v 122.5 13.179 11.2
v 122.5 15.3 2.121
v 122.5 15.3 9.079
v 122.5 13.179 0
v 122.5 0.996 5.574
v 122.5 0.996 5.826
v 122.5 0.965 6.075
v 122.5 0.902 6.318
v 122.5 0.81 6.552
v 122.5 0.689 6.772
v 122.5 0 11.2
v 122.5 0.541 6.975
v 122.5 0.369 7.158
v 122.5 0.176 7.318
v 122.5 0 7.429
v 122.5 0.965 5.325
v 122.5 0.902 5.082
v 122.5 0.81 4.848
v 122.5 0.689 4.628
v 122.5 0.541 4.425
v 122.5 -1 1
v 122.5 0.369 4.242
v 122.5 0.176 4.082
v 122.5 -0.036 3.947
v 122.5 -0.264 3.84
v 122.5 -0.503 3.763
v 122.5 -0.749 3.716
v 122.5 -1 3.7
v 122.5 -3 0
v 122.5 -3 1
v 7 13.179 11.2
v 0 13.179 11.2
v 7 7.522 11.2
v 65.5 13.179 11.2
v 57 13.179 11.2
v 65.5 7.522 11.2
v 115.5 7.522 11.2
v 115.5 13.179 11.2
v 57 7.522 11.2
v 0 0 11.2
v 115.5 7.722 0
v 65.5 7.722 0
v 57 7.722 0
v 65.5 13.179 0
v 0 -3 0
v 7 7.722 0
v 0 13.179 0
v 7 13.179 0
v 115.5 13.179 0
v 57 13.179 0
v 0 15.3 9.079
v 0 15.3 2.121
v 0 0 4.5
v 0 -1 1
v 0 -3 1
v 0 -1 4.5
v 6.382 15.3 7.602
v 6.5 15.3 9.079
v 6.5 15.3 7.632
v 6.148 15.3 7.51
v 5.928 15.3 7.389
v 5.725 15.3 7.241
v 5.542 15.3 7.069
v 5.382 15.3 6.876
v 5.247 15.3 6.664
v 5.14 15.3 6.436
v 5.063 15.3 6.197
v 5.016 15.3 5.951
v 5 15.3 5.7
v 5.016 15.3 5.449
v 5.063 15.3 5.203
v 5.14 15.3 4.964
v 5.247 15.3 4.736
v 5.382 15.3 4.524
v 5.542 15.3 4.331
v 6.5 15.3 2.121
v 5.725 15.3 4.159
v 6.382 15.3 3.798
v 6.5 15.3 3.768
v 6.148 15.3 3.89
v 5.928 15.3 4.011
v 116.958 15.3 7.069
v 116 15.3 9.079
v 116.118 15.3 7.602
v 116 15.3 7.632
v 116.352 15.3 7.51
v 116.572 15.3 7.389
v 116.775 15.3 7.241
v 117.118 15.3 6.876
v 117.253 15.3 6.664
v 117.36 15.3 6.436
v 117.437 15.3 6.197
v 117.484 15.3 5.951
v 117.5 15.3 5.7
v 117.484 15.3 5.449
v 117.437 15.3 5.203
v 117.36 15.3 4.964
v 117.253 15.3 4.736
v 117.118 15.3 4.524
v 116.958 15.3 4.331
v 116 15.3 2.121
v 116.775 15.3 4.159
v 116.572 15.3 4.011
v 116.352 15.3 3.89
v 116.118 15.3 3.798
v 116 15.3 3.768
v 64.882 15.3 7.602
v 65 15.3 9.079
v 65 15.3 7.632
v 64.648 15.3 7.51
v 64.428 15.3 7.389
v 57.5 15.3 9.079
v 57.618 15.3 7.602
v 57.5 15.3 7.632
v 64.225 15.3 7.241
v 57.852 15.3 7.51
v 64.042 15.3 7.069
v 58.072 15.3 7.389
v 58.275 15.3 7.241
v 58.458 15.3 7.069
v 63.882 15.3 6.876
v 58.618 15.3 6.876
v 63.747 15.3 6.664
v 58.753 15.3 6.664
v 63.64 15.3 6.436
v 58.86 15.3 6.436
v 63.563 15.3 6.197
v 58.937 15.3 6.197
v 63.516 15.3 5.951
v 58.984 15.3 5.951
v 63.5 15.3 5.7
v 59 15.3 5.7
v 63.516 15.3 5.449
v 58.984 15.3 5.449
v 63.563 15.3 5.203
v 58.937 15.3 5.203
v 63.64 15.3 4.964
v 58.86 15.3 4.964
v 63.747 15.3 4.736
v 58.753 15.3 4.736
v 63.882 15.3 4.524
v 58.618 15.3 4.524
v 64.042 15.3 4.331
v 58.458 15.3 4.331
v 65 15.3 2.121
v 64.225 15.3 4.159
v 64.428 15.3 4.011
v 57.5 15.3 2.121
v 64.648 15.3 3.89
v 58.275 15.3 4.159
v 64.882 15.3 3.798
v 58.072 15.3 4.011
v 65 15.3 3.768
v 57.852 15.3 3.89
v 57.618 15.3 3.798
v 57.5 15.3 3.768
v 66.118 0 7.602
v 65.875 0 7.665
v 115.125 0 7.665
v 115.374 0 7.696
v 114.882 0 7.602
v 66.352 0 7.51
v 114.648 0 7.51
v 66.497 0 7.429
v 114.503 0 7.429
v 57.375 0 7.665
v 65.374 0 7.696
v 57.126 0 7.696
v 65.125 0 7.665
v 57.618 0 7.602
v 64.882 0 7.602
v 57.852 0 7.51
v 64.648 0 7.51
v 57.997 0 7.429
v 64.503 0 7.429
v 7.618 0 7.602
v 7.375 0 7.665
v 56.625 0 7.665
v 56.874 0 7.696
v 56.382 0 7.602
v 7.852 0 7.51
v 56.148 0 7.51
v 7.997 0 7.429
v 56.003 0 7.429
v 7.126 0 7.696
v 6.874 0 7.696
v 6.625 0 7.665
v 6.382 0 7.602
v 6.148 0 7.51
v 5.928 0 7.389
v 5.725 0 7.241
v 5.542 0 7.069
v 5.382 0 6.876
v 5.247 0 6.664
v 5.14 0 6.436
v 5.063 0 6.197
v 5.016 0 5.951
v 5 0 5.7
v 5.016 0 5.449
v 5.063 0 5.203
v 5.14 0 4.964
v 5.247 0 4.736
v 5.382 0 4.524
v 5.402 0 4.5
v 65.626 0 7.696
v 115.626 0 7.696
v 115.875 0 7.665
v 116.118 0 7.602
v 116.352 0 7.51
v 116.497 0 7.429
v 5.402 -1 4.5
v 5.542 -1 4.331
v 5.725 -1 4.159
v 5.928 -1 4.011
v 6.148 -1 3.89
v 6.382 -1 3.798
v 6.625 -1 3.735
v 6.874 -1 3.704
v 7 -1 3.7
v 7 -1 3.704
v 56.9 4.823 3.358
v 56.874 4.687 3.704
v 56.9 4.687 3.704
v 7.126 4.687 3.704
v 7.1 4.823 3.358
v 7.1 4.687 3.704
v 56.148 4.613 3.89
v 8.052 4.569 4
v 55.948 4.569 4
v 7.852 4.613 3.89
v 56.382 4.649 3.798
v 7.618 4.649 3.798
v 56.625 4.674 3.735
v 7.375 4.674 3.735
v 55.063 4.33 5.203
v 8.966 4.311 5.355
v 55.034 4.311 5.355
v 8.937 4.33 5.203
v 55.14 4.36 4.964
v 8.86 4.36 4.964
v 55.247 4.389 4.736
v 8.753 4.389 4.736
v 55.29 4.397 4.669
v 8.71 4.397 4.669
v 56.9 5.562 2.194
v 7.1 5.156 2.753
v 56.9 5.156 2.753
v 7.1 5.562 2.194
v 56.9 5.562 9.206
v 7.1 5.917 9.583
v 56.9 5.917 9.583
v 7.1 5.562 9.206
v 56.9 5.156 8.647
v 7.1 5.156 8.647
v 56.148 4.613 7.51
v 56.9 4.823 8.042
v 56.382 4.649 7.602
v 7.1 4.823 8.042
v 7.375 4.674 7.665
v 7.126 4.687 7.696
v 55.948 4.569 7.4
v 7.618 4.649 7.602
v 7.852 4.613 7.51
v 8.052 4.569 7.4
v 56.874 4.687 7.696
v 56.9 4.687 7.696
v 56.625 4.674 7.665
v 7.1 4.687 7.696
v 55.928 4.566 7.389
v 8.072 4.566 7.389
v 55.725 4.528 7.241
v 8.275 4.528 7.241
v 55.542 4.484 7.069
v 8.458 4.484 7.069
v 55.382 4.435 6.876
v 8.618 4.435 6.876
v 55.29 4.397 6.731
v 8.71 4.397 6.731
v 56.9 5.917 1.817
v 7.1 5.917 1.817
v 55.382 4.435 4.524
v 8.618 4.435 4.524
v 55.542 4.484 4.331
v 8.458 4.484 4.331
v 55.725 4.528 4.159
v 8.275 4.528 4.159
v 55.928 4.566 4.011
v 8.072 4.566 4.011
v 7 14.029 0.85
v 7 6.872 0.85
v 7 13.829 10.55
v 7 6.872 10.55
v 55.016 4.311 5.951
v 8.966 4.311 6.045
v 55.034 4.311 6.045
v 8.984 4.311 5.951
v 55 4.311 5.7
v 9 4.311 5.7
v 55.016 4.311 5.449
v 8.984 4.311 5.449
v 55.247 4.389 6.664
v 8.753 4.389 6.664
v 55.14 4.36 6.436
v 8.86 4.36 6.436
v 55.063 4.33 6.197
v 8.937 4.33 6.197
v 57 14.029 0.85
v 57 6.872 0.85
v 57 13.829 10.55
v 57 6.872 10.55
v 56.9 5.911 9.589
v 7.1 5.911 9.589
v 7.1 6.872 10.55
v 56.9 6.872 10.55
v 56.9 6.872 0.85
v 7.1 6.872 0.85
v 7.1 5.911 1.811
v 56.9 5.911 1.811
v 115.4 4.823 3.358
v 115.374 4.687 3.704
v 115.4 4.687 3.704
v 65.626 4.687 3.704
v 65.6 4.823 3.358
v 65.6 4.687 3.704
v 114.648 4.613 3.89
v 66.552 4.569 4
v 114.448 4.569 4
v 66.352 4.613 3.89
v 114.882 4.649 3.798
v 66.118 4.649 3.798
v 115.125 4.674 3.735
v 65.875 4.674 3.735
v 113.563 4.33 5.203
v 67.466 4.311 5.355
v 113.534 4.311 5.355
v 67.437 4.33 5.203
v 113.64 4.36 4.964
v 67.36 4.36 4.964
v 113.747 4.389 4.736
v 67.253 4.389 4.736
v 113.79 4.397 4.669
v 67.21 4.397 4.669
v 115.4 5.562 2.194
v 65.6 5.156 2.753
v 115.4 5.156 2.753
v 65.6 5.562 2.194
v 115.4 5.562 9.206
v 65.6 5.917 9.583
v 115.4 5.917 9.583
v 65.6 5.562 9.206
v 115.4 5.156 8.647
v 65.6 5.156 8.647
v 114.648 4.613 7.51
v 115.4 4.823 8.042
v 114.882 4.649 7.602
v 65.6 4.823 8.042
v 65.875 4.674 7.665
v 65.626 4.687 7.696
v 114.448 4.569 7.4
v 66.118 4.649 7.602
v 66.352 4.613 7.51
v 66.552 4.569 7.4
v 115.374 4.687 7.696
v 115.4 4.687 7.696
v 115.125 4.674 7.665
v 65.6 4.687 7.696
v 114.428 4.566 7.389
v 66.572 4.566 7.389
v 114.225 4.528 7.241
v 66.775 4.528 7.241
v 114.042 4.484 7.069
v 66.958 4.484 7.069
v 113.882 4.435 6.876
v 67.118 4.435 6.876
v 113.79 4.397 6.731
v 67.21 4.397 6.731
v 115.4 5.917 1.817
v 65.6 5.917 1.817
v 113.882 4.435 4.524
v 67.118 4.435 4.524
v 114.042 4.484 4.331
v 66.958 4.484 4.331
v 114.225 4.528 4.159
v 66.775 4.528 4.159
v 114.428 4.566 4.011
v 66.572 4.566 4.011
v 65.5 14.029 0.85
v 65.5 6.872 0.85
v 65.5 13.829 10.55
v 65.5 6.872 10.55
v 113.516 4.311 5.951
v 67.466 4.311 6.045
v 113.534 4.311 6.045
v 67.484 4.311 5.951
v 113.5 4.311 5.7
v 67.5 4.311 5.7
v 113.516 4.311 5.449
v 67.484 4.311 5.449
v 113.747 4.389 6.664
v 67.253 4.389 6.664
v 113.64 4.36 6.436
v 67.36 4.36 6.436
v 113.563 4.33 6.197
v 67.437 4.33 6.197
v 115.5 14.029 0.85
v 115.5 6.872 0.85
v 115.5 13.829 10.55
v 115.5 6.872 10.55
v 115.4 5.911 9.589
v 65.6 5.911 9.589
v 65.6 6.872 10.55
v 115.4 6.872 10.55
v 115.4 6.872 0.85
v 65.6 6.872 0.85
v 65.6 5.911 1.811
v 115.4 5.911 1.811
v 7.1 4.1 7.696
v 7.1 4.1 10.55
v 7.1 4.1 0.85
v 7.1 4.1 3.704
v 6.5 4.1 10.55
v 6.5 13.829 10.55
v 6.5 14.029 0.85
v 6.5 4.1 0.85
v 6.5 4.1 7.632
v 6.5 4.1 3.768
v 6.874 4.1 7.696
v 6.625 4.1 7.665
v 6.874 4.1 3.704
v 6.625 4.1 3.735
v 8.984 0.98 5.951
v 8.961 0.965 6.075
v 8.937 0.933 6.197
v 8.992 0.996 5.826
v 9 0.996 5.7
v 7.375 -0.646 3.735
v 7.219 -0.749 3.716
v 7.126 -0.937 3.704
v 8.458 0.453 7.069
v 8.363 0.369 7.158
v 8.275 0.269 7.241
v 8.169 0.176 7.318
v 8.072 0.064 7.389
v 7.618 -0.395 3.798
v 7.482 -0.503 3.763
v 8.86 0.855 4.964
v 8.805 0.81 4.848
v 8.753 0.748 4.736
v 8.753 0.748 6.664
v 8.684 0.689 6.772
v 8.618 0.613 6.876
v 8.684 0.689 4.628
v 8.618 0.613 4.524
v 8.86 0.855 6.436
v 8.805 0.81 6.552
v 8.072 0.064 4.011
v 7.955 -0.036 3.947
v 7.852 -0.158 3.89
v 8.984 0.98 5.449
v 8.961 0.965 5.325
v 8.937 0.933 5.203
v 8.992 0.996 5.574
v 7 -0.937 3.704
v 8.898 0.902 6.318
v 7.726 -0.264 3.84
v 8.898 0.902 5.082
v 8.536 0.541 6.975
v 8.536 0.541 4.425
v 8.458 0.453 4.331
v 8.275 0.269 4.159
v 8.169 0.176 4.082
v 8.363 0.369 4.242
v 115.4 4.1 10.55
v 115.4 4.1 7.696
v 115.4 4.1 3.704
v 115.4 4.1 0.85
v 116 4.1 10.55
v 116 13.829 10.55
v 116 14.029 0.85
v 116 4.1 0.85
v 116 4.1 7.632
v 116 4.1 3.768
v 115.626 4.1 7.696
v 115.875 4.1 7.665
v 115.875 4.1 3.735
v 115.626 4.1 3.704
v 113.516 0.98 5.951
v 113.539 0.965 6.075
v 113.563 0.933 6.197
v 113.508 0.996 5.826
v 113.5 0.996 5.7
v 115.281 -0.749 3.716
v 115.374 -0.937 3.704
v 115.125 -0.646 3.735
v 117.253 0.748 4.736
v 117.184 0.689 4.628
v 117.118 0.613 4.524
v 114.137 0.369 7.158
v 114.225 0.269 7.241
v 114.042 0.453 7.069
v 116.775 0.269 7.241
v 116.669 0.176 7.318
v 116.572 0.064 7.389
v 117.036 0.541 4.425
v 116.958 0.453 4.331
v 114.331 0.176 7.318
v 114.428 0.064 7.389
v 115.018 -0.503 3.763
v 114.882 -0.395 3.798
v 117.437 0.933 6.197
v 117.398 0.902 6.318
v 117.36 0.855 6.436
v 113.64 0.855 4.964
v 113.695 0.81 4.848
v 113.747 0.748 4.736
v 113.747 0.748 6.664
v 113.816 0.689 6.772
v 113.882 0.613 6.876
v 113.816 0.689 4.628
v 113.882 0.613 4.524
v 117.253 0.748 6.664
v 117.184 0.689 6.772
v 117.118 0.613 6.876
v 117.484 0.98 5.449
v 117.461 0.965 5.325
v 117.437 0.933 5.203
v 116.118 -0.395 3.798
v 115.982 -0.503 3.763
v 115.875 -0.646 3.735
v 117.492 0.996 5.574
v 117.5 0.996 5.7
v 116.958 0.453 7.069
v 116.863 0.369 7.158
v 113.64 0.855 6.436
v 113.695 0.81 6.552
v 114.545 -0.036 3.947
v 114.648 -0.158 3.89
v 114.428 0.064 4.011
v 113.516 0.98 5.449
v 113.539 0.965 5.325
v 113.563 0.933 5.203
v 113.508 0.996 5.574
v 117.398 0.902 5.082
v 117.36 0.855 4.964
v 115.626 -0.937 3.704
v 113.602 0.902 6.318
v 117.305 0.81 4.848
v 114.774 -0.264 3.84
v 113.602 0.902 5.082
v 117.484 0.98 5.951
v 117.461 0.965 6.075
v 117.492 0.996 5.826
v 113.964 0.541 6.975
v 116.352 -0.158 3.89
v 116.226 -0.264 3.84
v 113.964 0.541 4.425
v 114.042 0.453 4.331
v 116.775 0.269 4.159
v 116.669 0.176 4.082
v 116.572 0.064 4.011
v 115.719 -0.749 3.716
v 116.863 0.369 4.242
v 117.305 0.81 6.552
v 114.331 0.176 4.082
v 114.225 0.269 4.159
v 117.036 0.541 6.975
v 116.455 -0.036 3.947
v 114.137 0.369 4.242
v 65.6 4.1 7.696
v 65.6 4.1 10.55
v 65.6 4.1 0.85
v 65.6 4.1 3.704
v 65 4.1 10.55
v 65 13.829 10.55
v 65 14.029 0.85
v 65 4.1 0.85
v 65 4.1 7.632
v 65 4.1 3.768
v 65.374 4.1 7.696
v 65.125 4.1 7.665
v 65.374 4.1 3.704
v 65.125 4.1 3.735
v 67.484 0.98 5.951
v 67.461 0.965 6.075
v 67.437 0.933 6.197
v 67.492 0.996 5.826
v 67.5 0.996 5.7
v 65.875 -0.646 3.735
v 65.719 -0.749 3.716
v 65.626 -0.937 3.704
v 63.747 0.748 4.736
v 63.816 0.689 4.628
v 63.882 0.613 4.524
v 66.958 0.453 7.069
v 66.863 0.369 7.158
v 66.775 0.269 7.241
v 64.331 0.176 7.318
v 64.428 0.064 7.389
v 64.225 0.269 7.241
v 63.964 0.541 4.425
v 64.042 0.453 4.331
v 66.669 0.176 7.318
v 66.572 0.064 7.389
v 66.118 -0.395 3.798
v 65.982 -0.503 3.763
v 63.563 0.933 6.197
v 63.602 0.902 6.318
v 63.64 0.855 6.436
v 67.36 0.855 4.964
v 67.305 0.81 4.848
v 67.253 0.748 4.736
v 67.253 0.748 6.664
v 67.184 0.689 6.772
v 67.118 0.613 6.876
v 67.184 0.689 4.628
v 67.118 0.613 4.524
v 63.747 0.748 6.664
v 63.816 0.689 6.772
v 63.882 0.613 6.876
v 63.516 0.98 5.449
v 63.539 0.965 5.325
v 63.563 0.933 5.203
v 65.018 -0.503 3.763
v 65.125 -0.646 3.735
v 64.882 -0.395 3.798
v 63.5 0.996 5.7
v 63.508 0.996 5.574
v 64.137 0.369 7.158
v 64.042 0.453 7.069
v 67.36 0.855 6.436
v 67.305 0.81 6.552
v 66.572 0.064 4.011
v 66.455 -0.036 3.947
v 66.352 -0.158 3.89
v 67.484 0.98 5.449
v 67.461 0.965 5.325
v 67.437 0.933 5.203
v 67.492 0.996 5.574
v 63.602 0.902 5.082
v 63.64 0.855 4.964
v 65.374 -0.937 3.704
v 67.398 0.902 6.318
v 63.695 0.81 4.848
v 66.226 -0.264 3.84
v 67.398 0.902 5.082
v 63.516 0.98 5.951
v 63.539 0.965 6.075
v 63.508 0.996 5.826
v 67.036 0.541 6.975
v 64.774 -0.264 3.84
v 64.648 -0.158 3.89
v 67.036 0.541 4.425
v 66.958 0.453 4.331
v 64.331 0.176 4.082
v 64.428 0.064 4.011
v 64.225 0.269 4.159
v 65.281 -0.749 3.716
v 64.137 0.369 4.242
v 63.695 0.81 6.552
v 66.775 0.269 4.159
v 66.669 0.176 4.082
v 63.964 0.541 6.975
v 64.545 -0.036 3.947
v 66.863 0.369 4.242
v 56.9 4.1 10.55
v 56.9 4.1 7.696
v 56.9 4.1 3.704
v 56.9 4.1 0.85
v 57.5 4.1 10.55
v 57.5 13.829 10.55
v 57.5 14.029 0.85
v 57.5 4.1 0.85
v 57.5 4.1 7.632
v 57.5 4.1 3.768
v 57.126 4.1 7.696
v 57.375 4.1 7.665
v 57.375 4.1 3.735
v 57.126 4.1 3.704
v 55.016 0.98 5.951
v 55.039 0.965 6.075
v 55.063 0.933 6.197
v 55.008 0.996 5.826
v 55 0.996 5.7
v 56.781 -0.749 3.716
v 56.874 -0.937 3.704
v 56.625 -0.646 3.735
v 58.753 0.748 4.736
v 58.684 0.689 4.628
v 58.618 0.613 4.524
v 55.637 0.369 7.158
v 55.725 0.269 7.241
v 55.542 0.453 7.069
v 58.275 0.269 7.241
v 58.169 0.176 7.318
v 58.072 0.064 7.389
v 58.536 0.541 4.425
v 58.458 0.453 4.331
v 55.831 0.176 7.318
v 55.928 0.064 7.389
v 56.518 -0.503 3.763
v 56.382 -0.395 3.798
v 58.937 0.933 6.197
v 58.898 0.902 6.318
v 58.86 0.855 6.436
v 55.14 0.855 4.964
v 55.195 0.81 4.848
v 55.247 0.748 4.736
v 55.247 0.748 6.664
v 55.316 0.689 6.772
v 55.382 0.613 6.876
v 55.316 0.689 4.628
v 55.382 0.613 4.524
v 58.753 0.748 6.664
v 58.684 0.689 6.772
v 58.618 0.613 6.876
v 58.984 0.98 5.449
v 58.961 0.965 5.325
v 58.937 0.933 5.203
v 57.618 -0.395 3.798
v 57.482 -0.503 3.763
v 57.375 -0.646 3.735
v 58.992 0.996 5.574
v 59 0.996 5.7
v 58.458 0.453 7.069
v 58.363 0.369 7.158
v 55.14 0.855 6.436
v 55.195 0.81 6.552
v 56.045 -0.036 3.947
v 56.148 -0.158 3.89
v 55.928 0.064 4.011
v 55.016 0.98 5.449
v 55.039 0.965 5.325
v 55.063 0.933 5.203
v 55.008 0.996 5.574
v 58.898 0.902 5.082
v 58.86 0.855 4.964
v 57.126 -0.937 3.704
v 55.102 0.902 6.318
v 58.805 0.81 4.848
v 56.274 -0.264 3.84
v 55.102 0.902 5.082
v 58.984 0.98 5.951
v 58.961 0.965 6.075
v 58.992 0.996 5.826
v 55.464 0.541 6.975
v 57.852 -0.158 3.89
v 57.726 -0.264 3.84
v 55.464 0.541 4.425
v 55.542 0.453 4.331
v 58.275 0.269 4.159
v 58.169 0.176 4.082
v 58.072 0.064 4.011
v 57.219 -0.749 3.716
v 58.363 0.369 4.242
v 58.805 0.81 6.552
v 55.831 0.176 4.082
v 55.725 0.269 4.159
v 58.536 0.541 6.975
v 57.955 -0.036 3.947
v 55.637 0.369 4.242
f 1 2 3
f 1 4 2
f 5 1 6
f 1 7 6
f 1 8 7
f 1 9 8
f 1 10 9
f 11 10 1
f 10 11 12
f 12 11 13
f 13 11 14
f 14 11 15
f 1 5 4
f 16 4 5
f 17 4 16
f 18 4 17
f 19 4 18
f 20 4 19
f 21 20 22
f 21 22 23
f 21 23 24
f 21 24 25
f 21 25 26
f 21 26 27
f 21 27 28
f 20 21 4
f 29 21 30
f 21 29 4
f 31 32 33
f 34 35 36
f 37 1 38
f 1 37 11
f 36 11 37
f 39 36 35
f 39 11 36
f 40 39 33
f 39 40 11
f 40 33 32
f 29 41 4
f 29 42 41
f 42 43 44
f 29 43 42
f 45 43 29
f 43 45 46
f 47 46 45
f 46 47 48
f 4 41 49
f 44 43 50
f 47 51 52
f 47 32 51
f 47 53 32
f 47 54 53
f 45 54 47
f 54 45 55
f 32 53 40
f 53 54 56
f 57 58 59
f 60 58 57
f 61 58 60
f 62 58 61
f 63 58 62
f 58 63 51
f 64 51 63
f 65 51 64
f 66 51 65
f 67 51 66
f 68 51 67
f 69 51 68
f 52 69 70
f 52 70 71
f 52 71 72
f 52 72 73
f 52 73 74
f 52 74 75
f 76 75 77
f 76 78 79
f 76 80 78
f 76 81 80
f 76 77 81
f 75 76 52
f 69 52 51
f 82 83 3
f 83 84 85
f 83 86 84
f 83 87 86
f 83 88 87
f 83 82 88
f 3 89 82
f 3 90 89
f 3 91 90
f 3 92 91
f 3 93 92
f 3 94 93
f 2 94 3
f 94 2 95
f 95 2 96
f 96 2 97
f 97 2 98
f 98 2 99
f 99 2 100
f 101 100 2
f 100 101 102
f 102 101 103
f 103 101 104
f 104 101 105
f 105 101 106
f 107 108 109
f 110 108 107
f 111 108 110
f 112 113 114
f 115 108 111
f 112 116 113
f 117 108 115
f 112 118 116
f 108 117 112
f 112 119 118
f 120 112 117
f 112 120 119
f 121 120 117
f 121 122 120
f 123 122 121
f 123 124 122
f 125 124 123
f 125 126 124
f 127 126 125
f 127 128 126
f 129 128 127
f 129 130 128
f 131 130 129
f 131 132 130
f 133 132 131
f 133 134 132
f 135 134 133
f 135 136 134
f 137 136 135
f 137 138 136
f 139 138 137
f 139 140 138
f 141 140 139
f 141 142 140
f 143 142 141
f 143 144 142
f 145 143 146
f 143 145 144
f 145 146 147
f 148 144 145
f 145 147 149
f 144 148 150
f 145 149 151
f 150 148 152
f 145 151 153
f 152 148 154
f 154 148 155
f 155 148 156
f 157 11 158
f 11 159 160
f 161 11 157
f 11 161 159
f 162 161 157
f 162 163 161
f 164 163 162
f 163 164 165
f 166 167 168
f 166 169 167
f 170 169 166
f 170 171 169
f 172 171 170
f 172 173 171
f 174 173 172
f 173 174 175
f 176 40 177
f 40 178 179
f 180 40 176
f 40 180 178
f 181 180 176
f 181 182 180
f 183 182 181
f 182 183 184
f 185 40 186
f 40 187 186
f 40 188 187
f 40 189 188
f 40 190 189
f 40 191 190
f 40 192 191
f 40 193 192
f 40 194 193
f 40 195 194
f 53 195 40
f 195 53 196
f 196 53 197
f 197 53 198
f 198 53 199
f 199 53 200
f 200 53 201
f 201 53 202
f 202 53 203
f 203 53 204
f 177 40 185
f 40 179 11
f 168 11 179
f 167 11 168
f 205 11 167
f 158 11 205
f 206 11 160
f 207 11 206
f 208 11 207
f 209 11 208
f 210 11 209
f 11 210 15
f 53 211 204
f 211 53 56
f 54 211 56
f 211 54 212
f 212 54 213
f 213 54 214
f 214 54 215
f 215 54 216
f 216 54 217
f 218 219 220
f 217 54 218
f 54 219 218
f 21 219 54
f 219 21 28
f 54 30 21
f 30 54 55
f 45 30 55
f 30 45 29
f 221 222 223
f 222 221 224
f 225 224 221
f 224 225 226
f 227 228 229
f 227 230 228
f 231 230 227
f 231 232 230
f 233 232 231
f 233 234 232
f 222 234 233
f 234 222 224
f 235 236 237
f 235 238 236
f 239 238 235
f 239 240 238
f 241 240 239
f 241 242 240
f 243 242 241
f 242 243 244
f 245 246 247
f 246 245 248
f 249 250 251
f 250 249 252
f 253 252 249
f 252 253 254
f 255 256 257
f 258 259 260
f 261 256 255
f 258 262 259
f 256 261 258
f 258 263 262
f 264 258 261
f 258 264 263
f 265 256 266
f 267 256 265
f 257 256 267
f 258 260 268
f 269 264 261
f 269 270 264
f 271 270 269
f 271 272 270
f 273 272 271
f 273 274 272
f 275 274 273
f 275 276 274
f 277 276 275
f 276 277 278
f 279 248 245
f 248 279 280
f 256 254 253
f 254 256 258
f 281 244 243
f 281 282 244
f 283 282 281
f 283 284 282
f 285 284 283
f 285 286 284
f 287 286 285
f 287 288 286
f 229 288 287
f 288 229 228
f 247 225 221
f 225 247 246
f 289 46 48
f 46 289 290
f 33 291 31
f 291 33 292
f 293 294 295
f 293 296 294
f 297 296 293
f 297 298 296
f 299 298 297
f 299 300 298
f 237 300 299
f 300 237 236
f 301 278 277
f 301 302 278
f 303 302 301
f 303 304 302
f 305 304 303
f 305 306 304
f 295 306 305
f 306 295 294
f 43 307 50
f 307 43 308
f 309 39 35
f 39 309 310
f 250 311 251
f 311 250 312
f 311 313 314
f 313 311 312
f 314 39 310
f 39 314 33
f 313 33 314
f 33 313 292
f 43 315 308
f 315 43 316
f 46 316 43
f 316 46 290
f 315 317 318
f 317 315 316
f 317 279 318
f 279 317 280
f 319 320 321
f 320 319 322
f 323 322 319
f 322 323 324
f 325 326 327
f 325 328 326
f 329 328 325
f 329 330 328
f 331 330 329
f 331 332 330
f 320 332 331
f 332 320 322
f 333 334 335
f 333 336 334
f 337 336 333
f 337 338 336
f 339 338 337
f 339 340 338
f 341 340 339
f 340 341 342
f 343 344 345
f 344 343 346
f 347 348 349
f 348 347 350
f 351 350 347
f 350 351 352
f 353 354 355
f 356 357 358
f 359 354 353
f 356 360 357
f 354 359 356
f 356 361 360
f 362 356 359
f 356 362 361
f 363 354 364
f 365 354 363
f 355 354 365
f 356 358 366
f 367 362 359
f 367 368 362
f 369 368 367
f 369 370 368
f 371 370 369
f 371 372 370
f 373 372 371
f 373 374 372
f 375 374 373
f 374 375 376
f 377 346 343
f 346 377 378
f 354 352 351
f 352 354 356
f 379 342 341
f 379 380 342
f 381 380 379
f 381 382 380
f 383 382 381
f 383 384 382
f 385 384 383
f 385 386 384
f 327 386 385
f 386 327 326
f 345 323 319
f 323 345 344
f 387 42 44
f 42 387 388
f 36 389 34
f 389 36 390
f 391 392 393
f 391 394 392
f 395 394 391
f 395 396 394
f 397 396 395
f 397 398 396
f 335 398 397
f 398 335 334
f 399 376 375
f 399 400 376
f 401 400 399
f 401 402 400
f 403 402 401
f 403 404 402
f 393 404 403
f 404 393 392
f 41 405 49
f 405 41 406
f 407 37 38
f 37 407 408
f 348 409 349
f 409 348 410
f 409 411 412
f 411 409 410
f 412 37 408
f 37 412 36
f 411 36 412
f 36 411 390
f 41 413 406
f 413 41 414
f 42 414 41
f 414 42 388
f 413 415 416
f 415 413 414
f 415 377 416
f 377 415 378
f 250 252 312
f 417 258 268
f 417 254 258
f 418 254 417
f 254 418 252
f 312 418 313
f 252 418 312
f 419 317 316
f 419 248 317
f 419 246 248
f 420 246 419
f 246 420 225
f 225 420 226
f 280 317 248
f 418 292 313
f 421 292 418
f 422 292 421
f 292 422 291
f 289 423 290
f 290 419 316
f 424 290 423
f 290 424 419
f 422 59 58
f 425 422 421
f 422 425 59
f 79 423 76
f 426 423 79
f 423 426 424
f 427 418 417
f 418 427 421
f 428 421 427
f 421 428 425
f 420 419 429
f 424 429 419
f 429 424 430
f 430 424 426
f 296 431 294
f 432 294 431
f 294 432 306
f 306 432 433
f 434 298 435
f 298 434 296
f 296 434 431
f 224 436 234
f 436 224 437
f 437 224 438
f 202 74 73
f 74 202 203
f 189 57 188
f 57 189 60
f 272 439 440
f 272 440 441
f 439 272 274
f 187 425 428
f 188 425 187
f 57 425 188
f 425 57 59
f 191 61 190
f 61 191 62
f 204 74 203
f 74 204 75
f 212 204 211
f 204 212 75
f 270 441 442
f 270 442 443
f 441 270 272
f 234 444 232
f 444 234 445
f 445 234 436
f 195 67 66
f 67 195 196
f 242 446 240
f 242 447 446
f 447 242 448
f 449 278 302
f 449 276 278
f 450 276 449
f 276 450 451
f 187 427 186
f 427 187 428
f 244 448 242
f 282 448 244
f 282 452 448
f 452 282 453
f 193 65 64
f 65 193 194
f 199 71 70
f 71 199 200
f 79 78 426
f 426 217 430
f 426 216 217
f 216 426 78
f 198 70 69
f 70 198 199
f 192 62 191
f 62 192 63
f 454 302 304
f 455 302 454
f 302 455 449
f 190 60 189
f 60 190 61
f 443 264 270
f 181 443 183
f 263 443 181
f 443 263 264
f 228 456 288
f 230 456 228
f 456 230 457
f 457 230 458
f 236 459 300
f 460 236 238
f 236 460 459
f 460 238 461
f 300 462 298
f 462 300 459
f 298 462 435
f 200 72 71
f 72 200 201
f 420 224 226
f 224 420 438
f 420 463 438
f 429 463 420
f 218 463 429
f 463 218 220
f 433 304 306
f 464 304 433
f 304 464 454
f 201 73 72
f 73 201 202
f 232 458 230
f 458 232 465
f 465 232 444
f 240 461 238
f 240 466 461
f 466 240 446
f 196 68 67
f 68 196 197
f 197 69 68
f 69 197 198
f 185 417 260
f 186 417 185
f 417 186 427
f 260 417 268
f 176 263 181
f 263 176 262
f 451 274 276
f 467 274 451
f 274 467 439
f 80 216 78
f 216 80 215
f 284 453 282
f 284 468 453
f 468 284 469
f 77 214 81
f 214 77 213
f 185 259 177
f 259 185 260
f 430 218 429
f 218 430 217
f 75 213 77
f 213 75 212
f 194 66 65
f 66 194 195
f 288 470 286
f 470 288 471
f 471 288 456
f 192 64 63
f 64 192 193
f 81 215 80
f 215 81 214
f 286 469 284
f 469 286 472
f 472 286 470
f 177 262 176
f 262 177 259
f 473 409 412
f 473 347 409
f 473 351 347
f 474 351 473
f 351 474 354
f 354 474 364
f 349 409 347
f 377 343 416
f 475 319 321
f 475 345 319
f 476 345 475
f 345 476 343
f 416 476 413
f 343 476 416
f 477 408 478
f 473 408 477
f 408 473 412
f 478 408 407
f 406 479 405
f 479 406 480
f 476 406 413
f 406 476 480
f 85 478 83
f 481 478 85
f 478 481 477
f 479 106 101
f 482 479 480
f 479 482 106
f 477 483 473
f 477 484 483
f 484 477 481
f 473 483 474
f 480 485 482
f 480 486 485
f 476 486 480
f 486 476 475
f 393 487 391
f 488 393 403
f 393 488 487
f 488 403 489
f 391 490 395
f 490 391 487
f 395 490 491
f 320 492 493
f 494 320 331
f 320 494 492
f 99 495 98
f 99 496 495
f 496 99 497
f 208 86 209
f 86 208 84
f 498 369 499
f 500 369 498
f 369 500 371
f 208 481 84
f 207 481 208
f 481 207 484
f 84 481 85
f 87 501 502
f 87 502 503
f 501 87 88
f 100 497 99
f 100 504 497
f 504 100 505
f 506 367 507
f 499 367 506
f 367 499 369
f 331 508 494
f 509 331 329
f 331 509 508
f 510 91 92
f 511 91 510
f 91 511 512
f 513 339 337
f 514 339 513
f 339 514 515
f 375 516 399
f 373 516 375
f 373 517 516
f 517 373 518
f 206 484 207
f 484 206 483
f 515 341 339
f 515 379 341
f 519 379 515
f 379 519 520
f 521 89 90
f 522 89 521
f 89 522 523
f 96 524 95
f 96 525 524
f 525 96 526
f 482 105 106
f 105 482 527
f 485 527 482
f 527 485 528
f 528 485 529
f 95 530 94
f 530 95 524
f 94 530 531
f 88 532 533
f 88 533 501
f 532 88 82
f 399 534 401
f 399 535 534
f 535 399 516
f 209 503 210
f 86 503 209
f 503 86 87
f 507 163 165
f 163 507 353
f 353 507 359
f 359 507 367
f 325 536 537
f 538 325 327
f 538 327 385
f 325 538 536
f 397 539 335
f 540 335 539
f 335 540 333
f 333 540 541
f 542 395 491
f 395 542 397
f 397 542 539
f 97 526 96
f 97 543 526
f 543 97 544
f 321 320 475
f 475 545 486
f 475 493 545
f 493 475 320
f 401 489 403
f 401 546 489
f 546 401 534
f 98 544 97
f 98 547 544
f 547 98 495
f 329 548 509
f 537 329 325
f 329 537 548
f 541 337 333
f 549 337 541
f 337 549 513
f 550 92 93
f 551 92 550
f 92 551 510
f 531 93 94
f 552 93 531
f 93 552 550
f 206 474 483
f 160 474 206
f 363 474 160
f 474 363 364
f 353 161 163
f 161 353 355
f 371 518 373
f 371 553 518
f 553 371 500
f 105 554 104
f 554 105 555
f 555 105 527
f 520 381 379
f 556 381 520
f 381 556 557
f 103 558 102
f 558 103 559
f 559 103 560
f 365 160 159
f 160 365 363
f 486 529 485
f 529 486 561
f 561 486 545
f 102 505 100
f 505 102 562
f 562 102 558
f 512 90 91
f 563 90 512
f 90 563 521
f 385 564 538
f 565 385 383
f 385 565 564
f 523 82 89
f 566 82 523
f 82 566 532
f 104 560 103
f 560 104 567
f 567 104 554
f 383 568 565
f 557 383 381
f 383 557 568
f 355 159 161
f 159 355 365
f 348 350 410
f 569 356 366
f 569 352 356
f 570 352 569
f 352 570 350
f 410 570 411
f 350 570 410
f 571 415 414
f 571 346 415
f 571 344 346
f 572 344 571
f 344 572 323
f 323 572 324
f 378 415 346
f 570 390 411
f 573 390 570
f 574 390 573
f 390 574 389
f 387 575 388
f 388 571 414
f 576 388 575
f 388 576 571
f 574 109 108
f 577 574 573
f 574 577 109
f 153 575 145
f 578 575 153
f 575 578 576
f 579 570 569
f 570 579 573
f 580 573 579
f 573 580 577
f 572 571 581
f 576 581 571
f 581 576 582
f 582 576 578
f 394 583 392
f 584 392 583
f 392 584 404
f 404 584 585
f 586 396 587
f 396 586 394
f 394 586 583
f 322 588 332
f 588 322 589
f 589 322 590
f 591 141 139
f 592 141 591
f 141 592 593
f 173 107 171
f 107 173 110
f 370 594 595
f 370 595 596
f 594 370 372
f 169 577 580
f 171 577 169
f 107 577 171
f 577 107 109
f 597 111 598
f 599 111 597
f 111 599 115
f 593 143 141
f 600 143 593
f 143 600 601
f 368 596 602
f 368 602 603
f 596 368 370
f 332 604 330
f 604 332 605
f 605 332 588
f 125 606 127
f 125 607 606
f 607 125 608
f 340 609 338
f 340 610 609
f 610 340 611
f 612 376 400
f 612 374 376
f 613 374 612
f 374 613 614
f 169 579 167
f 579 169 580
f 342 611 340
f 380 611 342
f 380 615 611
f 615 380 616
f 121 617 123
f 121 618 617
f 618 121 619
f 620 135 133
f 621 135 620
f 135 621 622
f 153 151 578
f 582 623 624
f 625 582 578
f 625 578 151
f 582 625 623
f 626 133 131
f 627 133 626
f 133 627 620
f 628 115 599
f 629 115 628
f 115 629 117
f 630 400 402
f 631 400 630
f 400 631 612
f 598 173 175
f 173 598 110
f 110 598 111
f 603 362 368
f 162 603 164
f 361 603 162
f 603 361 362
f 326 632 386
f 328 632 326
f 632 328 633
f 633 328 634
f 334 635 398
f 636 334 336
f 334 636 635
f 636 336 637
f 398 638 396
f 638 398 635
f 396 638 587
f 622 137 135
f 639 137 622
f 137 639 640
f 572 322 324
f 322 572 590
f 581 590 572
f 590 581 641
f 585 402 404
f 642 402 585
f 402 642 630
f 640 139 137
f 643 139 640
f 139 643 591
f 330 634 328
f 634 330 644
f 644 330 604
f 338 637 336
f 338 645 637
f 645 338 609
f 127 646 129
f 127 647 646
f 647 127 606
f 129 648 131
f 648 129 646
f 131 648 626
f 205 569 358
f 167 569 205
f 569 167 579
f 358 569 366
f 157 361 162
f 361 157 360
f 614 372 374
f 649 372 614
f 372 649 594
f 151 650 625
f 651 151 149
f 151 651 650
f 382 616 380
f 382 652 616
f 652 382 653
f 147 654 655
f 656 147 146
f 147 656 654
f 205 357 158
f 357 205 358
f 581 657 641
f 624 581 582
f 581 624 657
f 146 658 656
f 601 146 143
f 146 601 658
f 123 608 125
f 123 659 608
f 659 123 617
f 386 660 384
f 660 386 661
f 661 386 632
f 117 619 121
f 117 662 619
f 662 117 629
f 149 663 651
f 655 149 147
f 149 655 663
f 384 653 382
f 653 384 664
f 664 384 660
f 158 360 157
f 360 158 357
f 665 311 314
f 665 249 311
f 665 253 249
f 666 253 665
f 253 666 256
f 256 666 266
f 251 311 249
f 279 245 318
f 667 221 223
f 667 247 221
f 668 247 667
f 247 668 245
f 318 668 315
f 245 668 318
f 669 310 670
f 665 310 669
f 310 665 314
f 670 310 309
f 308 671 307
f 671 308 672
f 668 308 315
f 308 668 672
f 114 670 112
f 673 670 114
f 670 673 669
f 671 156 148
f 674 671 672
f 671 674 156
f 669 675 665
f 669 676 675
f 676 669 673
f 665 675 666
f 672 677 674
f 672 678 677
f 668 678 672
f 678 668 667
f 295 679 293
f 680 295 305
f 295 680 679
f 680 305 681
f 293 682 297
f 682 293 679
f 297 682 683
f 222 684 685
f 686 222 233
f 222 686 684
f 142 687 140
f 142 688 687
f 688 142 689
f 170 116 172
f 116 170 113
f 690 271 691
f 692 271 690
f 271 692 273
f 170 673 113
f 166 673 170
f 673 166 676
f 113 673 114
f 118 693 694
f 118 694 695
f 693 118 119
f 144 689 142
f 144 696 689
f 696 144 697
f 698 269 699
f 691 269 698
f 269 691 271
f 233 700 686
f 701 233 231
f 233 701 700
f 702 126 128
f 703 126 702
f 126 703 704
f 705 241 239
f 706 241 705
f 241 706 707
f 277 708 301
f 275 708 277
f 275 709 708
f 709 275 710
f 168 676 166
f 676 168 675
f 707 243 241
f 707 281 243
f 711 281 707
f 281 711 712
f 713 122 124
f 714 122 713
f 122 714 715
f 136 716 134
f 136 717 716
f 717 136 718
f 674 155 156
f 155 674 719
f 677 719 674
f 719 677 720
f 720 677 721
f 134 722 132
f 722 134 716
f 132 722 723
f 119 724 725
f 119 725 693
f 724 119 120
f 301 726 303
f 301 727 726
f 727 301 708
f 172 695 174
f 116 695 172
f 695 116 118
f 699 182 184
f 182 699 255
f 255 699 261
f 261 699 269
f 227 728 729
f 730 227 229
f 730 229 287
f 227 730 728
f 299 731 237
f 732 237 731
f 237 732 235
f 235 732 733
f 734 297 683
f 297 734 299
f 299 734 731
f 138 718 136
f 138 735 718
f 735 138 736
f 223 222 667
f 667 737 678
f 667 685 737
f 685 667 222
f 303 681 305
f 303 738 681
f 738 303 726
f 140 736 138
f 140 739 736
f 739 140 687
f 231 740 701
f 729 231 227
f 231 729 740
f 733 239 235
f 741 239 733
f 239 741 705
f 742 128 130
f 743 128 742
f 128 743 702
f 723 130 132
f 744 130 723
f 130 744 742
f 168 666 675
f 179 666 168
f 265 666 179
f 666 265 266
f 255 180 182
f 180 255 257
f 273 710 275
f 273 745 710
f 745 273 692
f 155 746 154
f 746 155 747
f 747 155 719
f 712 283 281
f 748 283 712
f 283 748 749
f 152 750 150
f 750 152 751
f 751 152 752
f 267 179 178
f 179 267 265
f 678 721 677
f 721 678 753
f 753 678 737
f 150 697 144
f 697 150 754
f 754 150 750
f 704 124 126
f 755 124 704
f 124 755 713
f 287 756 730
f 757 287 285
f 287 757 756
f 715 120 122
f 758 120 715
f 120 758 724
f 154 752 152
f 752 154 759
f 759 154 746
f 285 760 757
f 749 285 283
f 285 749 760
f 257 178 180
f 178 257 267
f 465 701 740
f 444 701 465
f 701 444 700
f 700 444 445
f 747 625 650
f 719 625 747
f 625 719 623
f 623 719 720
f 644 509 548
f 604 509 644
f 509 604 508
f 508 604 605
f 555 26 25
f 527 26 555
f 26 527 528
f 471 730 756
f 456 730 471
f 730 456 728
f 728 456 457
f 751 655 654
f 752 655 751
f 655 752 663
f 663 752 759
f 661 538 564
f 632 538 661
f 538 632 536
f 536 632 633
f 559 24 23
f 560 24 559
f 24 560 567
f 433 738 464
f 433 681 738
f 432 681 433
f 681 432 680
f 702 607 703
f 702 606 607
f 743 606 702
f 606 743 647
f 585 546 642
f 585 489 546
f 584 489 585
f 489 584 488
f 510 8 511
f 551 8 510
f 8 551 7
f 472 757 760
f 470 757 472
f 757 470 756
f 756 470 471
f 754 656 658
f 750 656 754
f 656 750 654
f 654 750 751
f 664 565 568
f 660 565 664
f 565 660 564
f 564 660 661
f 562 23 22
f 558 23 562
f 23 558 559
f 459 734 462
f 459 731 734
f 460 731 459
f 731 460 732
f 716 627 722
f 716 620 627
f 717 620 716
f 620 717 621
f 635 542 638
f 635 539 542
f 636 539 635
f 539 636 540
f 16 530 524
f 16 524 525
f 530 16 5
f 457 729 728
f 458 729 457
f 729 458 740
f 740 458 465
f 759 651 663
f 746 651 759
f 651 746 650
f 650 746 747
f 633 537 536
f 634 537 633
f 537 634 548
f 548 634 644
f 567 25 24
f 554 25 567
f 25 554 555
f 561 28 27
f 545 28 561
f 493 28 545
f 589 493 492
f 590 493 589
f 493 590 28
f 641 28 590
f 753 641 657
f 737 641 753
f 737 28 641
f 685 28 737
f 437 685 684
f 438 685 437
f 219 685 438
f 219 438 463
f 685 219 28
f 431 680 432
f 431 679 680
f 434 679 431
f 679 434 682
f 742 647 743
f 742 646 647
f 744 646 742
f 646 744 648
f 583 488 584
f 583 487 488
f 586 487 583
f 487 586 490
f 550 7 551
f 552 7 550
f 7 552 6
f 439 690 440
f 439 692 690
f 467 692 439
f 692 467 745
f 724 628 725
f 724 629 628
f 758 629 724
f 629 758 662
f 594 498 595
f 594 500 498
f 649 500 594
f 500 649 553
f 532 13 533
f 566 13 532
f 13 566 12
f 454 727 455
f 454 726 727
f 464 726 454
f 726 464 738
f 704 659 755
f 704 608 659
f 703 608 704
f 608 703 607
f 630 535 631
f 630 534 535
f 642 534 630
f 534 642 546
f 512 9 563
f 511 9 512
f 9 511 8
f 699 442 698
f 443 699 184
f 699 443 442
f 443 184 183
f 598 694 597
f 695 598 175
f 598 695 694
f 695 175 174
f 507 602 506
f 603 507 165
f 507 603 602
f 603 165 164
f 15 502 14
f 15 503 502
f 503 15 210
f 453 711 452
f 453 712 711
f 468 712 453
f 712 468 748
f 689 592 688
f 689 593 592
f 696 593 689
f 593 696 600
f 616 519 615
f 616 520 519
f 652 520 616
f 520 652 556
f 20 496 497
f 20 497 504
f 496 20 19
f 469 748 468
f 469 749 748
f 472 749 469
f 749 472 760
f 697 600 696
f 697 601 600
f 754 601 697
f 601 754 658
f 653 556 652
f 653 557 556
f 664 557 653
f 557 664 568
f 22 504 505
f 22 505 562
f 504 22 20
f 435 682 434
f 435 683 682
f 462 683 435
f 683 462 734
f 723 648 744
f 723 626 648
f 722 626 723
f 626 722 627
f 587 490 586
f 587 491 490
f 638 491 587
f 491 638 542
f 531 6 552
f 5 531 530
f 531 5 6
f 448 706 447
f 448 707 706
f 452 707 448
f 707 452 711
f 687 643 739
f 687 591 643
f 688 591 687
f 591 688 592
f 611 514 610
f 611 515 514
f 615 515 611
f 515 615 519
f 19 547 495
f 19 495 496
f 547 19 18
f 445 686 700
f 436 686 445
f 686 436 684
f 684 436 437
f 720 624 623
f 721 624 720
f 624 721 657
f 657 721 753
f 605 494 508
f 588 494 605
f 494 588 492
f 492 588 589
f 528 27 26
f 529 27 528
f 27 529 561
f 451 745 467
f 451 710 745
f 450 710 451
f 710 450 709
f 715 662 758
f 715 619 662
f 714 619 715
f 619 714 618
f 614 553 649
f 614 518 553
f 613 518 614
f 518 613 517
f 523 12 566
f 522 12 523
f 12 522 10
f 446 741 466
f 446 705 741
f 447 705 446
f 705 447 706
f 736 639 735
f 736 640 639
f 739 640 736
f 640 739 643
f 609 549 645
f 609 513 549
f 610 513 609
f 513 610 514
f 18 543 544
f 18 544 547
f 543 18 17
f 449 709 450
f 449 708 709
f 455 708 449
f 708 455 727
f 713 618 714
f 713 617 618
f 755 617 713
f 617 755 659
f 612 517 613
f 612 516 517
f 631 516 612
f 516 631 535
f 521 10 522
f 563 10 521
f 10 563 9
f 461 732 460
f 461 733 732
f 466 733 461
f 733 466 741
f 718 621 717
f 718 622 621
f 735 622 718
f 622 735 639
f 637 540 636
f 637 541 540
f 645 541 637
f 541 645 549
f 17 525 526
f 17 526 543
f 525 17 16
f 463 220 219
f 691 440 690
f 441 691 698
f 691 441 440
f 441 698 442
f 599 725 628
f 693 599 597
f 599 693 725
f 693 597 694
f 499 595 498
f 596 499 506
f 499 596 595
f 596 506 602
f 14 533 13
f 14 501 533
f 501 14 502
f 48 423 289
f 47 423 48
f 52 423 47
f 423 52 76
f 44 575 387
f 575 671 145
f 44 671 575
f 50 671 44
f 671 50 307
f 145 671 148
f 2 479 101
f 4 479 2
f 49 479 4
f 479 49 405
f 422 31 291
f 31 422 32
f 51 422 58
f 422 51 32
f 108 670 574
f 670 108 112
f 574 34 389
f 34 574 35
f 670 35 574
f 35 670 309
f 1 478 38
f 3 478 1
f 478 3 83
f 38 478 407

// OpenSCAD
$fn = 50;

width = 122.5;
height = 11.2;
depth = 15.3;
depth_to_pcb = 16.3;
height_to_pcb = 4.5;

aa_dia = 11;
aa_length = 44.5;
contact_length = 50.0 - aa_length;

module battery_with_insertion_path() {
    union() {
        rotate([0, 90, 0])
            cylinder(h=aa_length + contact_length, d = aa_dia);
        rotate([-45, 0, 0])
            translate([0, -aa_dia / 2, 0])
            cube([aa_length + contact_length, aa_dia, 100]);
        rotate([-135, 0, 0])
            translate([0, -aa_dia / 2, 0])
            cube([aa_length + contact_length, aa_dia, 100]);
    }
}

module contact() {
    /*rotate([180, 0, 0])
        union() {
            translate([-0.5, -4.7, -9.3/2])
                cube([0.8, 10.5, 9.3]);
            translate([-0.5, -4.7, -3.0/2])
                cube([0.6, 17, 3.0]);
        }*/
    translate([-0.5, -5.7, -9.7/2])
        cube([0.6, 30, 9.7]);
    translate([-0.5, -1, -9.7/2])
        cube([1.5, 25, 3]);
    rotate([90, 0, 0])
        cylinder(h=50, d=4, center=true);
}

difference() {
    // Start with a simple block as well as an extensinn towards the PCB.
    union() {
        cube([width, depth, height]);
        translate([0, depth - depth_to_pcb, 0])
            cube([width, depth_to_pcb, height_to_pcb]);
        translate([0, depth - depth_to_pcb - 2, 0])
            cube([width, depth_to_pcb + 2, 1]);
    }

    // Reserve space for two batteries, with a sufficiently large hole to insert the batteries.
    translate([7, depth - aa_dia / 2, height - aa_dia / 2])
        battery_with_insertion_path();
    translate([width - 7 - aa_length - contact_length, depth - aa_dia / 2, height - aa_dia / 2])
        battery_with_insertion_path();

    // Reserve space for the contacts, suitable for heat insertion.
    translate([7, depth - aa_dia / 2, height - aa_dia / 2])
        contact();
    translate([width - 7, depth - aa_dia / 2, height - aa_dia / 2])
        scale([-1, 1, 1])
        contact();
    translate([width - 7 - aa_length - contact_length, depth - aa_dia / 2, height - aa_dia / 2])
        contact();
    translate([7 + aa_length + contact_length, depth - aa_dia / 2, height - aa_dia / 2])
        scale([-1, 1, 1])
        contact();

    // Reserve space to run the cables along the part.
    translate([7, -1, height - aa_dia / 2])
        rotate([0, 90, 0])
        cylinder(d=4, h=width);
    
    // Chamfer the edges for easier insertion
    translate([width / 2, depth, 0])
        rotate([45, 0, 0])
        cube([width + 2, 3, 3], center = true);
    translate([width / 2, depth, height])
        rotate([45, 0, 0])
        cube([width + 2, 3, 3], center = true);
}
